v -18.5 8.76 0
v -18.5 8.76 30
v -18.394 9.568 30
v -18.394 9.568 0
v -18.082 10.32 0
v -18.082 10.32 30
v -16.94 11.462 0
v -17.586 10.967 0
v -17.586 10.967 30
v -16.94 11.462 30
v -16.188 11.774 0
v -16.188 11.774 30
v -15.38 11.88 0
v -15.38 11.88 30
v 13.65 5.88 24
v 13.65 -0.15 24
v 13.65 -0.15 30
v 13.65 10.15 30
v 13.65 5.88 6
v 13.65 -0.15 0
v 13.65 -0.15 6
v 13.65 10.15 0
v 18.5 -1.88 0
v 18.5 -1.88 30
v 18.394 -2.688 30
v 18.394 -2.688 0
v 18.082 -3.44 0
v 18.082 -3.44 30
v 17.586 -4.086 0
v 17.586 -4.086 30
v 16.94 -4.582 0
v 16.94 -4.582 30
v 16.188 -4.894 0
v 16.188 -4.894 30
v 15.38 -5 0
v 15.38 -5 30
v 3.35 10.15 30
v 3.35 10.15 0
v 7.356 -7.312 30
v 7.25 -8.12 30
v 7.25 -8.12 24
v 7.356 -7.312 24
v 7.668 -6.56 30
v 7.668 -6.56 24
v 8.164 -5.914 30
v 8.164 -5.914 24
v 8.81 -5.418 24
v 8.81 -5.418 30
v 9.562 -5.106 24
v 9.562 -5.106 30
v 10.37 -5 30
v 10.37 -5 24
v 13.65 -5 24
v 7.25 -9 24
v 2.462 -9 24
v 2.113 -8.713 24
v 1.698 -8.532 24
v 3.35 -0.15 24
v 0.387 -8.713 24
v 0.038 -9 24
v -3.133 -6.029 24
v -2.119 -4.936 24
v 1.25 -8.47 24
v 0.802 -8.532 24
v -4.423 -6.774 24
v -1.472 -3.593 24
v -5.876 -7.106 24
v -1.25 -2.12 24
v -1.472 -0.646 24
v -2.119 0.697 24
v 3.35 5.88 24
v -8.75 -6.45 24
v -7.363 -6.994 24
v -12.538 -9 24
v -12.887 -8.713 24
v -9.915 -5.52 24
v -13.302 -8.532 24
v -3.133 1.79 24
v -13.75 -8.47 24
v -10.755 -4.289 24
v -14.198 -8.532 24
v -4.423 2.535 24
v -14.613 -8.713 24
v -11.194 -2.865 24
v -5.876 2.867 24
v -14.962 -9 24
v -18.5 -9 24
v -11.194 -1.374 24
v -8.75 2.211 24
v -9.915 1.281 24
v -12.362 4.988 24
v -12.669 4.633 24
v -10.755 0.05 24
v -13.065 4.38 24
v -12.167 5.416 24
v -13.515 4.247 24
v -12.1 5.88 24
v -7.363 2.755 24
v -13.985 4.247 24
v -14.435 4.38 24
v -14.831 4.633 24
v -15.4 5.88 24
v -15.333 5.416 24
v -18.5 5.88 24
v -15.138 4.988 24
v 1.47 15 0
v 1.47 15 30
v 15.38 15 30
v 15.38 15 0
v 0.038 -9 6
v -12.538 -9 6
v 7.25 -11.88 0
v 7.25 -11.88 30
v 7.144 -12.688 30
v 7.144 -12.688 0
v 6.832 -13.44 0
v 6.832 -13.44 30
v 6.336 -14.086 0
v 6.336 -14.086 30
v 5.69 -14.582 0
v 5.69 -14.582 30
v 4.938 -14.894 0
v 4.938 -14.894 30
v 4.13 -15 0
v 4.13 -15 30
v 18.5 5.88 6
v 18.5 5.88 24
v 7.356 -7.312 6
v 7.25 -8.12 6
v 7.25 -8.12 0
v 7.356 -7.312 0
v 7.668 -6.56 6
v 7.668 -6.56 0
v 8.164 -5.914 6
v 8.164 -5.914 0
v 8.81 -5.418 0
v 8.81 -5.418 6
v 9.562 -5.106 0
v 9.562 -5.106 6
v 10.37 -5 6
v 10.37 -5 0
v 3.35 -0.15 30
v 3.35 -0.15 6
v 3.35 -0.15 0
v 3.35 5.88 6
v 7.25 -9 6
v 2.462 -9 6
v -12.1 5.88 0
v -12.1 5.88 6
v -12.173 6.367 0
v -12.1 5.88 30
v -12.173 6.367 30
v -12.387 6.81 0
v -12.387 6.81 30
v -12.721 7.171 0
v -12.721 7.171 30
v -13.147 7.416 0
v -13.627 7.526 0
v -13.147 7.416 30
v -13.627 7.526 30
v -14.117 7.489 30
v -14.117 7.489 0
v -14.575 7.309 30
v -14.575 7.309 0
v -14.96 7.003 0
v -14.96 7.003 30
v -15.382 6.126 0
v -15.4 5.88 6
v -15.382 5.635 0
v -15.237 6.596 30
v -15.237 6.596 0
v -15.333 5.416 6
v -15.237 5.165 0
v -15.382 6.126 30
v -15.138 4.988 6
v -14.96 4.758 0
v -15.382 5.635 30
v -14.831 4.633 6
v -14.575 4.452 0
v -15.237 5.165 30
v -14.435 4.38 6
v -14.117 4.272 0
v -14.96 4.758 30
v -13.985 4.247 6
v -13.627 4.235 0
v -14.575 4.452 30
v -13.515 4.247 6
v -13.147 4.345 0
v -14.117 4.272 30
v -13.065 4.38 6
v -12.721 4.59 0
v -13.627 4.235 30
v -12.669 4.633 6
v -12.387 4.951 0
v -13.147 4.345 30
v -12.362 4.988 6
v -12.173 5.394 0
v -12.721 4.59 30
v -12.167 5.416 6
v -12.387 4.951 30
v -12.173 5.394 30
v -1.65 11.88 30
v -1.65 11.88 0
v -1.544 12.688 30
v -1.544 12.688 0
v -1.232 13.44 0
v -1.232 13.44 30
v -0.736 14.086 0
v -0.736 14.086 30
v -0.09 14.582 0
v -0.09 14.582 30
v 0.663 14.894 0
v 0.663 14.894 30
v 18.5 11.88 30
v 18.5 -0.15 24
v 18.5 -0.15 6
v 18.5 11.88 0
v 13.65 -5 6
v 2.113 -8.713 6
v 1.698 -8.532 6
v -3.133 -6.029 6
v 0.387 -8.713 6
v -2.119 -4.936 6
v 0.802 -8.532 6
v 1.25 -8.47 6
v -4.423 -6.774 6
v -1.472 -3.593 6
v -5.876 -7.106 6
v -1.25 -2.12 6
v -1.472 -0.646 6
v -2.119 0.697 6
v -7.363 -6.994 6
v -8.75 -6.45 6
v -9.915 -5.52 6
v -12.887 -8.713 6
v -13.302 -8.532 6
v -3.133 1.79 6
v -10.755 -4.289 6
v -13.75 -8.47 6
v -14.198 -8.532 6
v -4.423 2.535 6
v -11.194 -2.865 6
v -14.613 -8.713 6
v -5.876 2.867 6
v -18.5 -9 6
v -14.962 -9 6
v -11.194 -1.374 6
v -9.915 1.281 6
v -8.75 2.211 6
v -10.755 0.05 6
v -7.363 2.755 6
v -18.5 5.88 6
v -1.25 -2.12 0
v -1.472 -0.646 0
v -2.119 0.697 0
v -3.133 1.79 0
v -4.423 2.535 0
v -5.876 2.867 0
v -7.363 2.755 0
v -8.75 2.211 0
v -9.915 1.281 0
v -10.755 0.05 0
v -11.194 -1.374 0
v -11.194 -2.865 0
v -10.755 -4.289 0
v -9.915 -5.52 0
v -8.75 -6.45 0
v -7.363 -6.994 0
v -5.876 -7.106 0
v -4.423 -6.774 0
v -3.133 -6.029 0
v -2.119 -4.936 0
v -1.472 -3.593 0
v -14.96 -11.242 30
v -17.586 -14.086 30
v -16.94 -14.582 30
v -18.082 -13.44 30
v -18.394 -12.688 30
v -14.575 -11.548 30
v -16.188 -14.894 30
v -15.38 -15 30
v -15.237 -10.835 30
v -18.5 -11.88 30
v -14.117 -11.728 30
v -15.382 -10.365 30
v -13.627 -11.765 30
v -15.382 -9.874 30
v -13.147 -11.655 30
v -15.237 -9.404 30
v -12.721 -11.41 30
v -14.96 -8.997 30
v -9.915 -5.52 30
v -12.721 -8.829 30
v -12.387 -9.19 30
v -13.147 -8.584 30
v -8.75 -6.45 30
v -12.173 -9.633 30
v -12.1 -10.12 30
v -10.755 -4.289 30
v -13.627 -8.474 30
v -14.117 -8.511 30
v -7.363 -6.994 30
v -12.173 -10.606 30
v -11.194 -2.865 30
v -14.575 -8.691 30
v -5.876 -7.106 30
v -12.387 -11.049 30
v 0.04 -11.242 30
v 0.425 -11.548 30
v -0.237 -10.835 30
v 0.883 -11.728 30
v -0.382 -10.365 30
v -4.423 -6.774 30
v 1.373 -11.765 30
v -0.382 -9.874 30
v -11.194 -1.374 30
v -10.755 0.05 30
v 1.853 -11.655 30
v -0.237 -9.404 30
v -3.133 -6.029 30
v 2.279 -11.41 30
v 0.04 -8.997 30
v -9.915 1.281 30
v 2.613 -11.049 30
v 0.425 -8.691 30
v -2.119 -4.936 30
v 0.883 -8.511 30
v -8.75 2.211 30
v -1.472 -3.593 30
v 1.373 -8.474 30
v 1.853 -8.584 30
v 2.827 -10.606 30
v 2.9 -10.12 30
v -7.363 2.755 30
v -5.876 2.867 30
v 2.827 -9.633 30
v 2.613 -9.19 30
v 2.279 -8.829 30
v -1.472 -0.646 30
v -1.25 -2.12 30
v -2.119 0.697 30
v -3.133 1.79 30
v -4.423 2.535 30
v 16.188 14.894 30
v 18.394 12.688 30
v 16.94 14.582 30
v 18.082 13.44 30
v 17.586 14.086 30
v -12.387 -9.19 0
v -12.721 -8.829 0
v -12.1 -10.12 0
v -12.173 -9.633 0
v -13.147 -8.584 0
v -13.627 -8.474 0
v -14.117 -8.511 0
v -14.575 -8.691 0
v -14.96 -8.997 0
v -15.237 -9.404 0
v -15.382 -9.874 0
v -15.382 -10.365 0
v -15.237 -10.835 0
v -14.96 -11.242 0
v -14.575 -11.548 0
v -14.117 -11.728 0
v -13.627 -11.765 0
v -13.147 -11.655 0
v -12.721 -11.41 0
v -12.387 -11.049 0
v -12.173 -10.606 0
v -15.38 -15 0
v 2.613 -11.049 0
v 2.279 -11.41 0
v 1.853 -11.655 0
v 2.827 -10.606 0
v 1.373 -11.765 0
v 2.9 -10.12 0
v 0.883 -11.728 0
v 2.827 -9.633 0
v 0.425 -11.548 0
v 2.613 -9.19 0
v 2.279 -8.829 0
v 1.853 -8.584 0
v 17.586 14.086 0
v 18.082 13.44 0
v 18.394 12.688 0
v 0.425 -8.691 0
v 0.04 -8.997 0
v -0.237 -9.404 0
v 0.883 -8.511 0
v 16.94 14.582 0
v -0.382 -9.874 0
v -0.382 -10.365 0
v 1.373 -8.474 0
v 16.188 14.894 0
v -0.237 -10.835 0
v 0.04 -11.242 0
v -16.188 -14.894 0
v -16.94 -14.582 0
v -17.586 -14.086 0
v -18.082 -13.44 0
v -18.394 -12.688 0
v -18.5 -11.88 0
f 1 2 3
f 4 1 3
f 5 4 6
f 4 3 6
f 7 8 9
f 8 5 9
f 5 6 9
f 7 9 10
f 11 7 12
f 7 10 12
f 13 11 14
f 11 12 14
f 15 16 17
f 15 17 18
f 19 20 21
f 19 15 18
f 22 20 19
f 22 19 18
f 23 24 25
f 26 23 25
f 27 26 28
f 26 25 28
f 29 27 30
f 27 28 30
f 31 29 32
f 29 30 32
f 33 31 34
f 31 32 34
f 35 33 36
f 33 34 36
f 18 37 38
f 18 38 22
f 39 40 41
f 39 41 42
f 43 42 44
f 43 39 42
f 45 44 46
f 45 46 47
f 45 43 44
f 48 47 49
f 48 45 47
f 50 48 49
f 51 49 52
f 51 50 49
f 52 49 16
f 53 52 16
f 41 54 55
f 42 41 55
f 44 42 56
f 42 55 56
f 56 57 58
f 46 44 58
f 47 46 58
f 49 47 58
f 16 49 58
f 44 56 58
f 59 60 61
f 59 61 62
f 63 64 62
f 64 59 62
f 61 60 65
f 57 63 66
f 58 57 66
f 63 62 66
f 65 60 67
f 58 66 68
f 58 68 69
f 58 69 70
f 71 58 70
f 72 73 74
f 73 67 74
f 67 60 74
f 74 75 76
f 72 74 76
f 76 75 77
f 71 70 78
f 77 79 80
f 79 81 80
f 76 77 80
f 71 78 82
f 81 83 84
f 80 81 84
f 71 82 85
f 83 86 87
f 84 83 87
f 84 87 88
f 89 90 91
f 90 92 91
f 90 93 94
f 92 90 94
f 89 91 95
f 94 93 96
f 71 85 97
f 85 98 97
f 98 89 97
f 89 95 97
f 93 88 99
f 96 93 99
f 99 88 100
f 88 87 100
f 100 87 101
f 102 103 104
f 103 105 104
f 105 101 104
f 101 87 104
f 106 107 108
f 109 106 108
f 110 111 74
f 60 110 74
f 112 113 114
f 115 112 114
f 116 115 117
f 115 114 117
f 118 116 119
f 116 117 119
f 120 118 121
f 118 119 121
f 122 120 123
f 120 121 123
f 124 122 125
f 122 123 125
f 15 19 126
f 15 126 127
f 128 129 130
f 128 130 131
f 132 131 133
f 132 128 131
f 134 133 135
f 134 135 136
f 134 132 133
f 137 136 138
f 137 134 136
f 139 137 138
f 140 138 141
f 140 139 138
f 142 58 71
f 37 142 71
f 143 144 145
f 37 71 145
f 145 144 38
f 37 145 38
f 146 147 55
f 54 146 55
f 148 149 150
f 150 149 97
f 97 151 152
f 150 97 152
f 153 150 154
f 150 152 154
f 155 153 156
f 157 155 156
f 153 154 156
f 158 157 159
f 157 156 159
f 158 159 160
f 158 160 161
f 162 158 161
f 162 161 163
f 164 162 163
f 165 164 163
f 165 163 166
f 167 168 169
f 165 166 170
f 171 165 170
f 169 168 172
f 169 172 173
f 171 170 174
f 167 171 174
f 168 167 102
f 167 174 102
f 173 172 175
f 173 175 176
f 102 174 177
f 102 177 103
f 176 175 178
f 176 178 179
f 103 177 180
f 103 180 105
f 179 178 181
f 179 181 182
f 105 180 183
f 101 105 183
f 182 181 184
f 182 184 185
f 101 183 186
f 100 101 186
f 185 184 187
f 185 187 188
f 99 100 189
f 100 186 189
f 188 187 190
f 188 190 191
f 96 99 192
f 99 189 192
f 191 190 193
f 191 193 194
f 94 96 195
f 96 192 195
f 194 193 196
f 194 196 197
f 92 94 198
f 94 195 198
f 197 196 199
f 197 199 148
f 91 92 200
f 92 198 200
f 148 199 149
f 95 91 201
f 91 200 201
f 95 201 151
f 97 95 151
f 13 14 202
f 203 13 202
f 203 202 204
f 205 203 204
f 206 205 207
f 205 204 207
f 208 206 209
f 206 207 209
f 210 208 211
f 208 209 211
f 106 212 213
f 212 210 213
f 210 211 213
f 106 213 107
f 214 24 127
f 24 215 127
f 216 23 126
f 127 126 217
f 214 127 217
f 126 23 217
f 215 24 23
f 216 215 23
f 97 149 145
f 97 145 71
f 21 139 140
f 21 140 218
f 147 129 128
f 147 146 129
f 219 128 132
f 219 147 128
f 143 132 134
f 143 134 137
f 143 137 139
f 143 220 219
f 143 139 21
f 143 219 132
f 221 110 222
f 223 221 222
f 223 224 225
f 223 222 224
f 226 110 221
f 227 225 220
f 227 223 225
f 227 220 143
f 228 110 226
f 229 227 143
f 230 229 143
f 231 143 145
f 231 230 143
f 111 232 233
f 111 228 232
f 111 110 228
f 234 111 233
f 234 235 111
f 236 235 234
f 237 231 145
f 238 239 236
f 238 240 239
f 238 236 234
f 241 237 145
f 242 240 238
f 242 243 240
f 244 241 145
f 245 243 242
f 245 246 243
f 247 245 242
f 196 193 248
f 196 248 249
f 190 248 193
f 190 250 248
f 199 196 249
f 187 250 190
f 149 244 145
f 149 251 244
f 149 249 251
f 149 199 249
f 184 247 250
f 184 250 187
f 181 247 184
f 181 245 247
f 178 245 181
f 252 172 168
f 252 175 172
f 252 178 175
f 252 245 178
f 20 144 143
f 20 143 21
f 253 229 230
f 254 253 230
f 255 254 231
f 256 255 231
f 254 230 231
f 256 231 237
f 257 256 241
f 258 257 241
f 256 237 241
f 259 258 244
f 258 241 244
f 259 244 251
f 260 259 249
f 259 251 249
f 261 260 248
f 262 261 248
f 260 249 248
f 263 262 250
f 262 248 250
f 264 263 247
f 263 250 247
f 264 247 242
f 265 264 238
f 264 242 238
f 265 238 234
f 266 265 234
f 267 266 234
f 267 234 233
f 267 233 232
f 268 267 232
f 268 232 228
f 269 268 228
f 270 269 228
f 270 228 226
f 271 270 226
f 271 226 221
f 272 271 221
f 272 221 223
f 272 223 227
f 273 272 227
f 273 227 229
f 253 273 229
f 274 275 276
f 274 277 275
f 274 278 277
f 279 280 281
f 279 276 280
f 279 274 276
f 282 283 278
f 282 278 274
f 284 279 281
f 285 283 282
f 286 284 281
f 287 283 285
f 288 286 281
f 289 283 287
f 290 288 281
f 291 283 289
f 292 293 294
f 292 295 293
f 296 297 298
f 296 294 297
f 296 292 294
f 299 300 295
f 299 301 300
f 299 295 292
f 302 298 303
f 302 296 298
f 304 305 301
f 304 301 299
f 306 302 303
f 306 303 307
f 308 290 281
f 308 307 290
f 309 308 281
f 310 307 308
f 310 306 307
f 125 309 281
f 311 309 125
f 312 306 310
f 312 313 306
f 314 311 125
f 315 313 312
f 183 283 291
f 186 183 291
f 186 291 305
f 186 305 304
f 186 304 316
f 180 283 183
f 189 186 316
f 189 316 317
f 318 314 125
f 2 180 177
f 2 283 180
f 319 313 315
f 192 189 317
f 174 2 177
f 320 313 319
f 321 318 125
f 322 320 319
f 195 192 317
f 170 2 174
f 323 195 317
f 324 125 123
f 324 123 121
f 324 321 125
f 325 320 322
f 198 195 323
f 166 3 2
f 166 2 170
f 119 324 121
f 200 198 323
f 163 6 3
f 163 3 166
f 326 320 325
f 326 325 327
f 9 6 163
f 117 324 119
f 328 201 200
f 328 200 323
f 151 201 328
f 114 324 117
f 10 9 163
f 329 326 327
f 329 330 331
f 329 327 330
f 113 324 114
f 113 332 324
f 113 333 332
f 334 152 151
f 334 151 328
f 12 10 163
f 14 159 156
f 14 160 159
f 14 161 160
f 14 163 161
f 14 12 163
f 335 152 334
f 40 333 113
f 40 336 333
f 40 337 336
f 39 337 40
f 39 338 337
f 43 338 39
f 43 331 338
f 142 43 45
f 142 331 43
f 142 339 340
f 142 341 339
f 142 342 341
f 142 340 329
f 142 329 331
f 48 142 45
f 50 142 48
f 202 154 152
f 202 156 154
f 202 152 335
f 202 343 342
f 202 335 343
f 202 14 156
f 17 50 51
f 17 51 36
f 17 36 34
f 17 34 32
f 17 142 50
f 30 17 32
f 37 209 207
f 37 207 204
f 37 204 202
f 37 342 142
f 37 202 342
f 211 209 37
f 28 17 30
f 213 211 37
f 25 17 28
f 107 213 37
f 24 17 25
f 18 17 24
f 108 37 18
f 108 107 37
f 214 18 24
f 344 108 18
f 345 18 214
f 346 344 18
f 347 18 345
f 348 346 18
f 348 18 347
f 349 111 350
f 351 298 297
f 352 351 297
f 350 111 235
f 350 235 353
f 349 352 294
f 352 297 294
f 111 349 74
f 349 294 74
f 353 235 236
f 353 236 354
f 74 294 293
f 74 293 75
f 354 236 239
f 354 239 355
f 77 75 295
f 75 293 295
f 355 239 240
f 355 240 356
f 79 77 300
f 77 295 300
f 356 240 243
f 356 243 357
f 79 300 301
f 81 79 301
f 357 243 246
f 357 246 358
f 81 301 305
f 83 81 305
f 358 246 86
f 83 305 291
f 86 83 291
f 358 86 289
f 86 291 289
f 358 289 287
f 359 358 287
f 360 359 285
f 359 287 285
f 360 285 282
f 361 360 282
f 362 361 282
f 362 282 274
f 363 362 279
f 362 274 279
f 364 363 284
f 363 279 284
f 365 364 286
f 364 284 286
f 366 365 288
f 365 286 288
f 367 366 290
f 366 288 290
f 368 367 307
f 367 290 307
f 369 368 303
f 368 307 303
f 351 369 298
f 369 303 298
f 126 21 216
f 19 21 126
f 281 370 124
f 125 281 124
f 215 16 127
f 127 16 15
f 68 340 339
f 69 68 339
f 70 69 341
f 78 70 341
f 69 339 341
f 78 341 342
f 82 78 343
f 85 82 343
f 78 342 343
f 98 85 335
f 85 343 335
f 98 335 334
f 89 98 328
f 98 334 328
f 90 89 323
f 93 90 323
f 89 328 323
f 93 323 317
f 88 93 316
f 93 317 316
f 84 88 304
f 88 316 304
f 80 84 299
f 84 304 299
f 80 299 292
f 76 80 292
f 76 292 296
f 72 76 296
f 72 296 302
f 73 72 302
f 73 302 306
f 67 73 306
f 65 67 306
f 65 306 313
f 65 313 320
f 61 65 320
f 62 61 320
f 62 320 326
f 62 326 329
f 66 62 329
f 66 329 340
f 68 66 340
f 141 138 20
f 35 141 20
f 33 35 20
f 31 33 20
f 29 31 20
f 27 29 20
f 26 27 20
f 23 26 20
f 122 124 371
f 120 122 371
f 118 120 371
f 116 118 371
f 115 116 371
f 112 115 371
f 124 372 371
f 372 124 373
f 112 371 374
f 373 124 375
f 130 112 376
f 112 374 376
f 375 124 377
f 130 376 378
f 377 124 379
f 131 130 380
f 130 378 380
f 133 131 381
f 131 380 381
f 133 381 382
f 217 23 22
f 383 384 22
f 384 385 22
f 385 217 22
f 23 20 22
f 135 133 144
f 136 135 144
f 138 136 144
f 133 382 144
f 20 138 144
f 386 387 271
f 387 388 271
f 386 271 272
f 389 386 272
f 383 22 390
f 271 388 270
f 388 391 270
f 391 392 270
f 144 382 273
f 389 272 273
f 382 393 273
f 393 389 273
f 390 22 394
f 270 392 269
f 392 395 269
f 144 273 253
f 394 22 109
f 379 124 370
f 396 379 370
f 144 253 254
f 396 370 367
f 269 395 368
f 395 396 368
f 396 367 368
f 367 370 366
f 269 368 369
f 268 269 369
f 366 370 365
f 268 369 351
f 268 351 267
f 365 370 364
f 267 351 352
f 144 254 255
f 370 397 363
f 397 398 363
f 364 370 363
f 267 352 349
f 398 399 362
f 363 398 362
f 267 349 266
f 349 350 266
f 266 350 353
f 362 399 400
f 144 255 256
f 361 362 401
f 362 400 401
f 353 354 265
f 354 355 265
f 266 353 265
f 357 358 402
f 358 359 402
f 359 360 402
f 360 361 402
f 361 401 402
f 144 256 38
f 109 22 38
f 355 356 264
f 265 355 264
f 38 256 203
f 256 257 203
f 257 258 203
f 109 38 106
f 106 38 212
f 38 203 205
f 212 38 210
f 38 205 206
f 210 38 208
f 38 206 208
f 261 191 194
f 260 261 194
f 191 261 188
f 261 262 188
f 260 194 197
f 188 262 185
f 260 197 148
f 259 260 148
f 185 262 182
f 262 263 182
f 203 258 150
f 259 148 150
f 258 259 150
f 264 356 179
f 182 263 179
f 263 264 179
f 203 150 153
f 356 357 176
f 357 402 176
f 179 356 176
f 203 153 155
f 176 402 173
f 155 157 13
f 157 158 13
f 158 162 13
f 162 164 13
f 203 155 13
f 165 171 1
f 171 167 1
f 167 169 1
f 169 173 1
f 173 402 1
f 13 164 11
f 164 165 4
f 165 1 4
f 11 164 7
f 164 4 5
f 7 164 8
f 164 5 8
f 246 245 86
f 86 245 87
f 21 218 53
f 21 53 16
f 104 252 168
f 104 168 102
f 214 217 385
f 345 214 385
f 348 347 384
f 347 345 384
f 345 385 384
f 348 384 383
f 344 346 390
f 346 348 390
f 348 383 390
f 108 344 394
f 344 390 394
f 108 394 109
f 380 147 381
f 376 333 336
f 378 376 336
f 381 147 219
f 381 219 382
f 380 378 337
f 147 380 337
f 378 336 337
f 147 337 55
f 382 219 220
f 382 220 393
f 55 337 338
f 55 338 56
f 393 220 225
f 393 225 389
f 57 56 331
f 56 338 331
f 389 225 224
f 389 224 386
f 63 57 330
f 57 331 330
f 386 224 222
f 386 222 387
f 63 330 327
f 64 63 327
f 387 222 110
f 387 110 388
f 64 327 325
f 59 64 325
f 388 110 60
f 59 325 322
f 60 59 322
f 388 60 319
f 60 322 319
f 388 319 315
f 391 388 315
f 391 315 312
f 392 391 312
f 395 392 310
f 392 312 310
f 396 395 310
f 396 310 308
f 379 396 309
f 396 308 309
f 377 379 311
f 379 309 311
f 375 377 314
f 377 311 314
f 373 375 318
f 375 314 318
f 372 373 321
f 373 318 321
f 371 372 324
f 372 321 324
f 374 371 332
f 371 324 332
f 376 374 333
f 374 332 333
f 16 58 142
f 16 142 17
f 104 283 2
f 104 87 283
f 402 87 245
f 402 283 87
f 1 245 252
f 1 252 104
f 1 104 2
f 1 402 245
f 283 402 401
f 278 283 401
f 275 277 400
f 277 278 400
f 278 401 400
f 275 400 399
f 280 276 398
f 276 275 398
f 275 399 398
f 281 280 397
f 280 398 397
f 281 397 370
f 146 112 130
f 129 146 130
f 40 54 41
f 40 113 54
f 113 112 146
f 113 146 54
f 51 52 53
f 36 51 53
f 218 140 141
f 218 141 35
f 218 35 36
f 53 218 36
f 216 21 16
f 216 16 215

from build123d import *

# Parameters (mm, degrees)
SKETCH_1_W          = 37
SKETCH_1_H          = 30
SKETCH_1_W_2        = 10.3
SKETCH_1_H_2        = 10.3
EXTRUDE_1_DEPTH     = 30
SKETCH_2_R          = 1.65
SKETCH_2_W          = 11.25
SKETCH_2_H          = 10
CUT_EXTRUDE_1_DEPTH = 39.304699451
SKETCH_3_R          = 5
SKETCH_3_W          = 16.85
SKETCH_3_H          = 3.119518618
CUT_EXTRUDE_2_DEPTH = 39.304699451
SKETCH_4_W          = 18
SKETCH_4_H          = 14.880481382
CUT_EXTRUDE_3_DEPTH = 50.939963957
SKETCH_5_W          = 4.85
SKETCH_5_H          = 4.85
EXTRUDE_2_DEPTH     = 18
FILLET_2_R          = 3.12


with BuildPart() as part:
    # 草图1 → 凸台-拉伸1 (new body)
    with BuildSketch(Plane.XY):
        Rectangle(SKETCH_1_W, SKETCH_1_H)
        with Locations((8.5, 5)):
            Rectangle(SKETCH_1_W_2, SKETCH_1_H_2, mode=Mode.SUBTRACT)
    extrude(amount=EXTRUDE_1_DEPTH)

    # 草图2 → 切除-拉伸1 (cut, through all)
    with BuildSketch(Plane.XY.offset(30)):
        with Locations((-13.75, 5.880481382)):
            Circle(SKETCH_2_R)
        with Locations((-13.75, -10.119518618)):
            Circle(SKETCH_2_R)
        with Locations((1.25, -10.119518618)):
            Circle(SKETCH_2_R)
        with Locations((12.875, -10)):
            Rectangle(SKETCH_2_W, SKETCH_2_H)
    extrude(amount=-CUT_EXTRUDE_1_DEPTH, mode=Mode.SUBTRACT)

    # 草图3 → 切除-拉伸2 (cut, through all)
    with BuildSketch(Plane.XY.offset(30)):
        with Locations((-6.25, -2.119518618)):
            Circle(SKETCH_3_R)
        with Locations((-10.075, 13.440240691)):
            Rectangle(SKETCH_3_W, SKETCH_3_H)
    extrude(amount=-CUT_EXTRUDE_2_DEPTH, mode=Mode.SUBTRACT)

    # 草图4 → 切除-拉伸3 (cut, through all)
    with BuildSketch(Plane.ZY.offset(18.5)):
        with Locations((15, -1.559759309)):
            Rectangle(SKETCH_4_W, SKETCH_4_H)
    extrude(amount=-CUT_EXTRUDE_3_DEPTH, mode=Mode.SUBTRACT)

    # 草图5 → 凸台-拉伸2 (add)
    with BuildSketch(Plane.XY.offset(6)):
        with Locations((16.075, -2.575)):
            Rectangle(SKETCH_5_W, SKETCH_5_H)
    extrude(amount=EXTRUDE_2_DEPTH)

    # 圆角2
    # the kernel refuses this fillet: 3.12 mm, written as the material it adds along each edge
    with BuildSketch(Plane(origin=(7.25, -5, 6), x_dir=(0, -1, 0), z_dir=(0, 0, -1)), Plane(origin=(7.25, -5, 30), x_dir=(0, -1, 0), z_dir=(0, 0, -1))) as fillet_2_piece_1:
        with BuildLine():
            CenterArc((FILLET_2_R, -FILLET_2_R), FILLET_2_R, 90, 90)
            Line((0, -FILLET_2_R), (0, 0))
            Line((0, 0), (FILLET_2_R, 0))
        make_face()
    extrude(amount=6)
    # the kernel refuses this fillet: 3.12 mm, written as the material it takes off along each edge
    with BuildSketch(Plane(origin=(-1.65, 15, 37.8), x_dir=(1, 0, 0), z_dir=(0, 0, -1)), Plane(origin=(-18.5, 11.880481382, 37.8), x_dir=(1, 0, 0), z_dir=(0, 0, -1)), Plane(origin=(18.5, 15, -7.8), x_dir=(-1, 0, 0), z_dir=(0, 0, 1)), Plane(origin=(7.25, -15, 37.8), x_dir=(-1, 0, 0), z_dir=(0, 0, -1)), Plane(origin=(-18.5, -15, -7.8), x_dir=(1, 0, 0), z_dir=(0, 0, 1))) as fillet_2_2_piece_1:
        with BuildLine():
            CenterArc((FILLET_2_R, FILLET_2_R), FILLET_2_R, 180, 90)
            Line((0, FILLET_2_R), (0, 0))
            Line((0, 0), (FILLET_2_R, 0))
        make_face()
    extrude(amount=45.6, mode=Mode.SUBTRACT)
    with BuildSketch(Plane(origin=(18.5, -5, 37.8), x_dir=(0, 1, 0), z_dir=(0, 0, -1))) as fillet_2_2_piece_2:
        with BuildLine():
            CenterArc((FILLET_2_R, -FILLET_2_R), FILLET_2_R, 90, 90)
            Line((0, -FILLET_2_R), (0, 0))
            Line((0, 0), (FILLET_2_R, 0))
        make_face()
    extrude(amount=45.6, mode=Mode.SUBTRACT)


solid = part.part
